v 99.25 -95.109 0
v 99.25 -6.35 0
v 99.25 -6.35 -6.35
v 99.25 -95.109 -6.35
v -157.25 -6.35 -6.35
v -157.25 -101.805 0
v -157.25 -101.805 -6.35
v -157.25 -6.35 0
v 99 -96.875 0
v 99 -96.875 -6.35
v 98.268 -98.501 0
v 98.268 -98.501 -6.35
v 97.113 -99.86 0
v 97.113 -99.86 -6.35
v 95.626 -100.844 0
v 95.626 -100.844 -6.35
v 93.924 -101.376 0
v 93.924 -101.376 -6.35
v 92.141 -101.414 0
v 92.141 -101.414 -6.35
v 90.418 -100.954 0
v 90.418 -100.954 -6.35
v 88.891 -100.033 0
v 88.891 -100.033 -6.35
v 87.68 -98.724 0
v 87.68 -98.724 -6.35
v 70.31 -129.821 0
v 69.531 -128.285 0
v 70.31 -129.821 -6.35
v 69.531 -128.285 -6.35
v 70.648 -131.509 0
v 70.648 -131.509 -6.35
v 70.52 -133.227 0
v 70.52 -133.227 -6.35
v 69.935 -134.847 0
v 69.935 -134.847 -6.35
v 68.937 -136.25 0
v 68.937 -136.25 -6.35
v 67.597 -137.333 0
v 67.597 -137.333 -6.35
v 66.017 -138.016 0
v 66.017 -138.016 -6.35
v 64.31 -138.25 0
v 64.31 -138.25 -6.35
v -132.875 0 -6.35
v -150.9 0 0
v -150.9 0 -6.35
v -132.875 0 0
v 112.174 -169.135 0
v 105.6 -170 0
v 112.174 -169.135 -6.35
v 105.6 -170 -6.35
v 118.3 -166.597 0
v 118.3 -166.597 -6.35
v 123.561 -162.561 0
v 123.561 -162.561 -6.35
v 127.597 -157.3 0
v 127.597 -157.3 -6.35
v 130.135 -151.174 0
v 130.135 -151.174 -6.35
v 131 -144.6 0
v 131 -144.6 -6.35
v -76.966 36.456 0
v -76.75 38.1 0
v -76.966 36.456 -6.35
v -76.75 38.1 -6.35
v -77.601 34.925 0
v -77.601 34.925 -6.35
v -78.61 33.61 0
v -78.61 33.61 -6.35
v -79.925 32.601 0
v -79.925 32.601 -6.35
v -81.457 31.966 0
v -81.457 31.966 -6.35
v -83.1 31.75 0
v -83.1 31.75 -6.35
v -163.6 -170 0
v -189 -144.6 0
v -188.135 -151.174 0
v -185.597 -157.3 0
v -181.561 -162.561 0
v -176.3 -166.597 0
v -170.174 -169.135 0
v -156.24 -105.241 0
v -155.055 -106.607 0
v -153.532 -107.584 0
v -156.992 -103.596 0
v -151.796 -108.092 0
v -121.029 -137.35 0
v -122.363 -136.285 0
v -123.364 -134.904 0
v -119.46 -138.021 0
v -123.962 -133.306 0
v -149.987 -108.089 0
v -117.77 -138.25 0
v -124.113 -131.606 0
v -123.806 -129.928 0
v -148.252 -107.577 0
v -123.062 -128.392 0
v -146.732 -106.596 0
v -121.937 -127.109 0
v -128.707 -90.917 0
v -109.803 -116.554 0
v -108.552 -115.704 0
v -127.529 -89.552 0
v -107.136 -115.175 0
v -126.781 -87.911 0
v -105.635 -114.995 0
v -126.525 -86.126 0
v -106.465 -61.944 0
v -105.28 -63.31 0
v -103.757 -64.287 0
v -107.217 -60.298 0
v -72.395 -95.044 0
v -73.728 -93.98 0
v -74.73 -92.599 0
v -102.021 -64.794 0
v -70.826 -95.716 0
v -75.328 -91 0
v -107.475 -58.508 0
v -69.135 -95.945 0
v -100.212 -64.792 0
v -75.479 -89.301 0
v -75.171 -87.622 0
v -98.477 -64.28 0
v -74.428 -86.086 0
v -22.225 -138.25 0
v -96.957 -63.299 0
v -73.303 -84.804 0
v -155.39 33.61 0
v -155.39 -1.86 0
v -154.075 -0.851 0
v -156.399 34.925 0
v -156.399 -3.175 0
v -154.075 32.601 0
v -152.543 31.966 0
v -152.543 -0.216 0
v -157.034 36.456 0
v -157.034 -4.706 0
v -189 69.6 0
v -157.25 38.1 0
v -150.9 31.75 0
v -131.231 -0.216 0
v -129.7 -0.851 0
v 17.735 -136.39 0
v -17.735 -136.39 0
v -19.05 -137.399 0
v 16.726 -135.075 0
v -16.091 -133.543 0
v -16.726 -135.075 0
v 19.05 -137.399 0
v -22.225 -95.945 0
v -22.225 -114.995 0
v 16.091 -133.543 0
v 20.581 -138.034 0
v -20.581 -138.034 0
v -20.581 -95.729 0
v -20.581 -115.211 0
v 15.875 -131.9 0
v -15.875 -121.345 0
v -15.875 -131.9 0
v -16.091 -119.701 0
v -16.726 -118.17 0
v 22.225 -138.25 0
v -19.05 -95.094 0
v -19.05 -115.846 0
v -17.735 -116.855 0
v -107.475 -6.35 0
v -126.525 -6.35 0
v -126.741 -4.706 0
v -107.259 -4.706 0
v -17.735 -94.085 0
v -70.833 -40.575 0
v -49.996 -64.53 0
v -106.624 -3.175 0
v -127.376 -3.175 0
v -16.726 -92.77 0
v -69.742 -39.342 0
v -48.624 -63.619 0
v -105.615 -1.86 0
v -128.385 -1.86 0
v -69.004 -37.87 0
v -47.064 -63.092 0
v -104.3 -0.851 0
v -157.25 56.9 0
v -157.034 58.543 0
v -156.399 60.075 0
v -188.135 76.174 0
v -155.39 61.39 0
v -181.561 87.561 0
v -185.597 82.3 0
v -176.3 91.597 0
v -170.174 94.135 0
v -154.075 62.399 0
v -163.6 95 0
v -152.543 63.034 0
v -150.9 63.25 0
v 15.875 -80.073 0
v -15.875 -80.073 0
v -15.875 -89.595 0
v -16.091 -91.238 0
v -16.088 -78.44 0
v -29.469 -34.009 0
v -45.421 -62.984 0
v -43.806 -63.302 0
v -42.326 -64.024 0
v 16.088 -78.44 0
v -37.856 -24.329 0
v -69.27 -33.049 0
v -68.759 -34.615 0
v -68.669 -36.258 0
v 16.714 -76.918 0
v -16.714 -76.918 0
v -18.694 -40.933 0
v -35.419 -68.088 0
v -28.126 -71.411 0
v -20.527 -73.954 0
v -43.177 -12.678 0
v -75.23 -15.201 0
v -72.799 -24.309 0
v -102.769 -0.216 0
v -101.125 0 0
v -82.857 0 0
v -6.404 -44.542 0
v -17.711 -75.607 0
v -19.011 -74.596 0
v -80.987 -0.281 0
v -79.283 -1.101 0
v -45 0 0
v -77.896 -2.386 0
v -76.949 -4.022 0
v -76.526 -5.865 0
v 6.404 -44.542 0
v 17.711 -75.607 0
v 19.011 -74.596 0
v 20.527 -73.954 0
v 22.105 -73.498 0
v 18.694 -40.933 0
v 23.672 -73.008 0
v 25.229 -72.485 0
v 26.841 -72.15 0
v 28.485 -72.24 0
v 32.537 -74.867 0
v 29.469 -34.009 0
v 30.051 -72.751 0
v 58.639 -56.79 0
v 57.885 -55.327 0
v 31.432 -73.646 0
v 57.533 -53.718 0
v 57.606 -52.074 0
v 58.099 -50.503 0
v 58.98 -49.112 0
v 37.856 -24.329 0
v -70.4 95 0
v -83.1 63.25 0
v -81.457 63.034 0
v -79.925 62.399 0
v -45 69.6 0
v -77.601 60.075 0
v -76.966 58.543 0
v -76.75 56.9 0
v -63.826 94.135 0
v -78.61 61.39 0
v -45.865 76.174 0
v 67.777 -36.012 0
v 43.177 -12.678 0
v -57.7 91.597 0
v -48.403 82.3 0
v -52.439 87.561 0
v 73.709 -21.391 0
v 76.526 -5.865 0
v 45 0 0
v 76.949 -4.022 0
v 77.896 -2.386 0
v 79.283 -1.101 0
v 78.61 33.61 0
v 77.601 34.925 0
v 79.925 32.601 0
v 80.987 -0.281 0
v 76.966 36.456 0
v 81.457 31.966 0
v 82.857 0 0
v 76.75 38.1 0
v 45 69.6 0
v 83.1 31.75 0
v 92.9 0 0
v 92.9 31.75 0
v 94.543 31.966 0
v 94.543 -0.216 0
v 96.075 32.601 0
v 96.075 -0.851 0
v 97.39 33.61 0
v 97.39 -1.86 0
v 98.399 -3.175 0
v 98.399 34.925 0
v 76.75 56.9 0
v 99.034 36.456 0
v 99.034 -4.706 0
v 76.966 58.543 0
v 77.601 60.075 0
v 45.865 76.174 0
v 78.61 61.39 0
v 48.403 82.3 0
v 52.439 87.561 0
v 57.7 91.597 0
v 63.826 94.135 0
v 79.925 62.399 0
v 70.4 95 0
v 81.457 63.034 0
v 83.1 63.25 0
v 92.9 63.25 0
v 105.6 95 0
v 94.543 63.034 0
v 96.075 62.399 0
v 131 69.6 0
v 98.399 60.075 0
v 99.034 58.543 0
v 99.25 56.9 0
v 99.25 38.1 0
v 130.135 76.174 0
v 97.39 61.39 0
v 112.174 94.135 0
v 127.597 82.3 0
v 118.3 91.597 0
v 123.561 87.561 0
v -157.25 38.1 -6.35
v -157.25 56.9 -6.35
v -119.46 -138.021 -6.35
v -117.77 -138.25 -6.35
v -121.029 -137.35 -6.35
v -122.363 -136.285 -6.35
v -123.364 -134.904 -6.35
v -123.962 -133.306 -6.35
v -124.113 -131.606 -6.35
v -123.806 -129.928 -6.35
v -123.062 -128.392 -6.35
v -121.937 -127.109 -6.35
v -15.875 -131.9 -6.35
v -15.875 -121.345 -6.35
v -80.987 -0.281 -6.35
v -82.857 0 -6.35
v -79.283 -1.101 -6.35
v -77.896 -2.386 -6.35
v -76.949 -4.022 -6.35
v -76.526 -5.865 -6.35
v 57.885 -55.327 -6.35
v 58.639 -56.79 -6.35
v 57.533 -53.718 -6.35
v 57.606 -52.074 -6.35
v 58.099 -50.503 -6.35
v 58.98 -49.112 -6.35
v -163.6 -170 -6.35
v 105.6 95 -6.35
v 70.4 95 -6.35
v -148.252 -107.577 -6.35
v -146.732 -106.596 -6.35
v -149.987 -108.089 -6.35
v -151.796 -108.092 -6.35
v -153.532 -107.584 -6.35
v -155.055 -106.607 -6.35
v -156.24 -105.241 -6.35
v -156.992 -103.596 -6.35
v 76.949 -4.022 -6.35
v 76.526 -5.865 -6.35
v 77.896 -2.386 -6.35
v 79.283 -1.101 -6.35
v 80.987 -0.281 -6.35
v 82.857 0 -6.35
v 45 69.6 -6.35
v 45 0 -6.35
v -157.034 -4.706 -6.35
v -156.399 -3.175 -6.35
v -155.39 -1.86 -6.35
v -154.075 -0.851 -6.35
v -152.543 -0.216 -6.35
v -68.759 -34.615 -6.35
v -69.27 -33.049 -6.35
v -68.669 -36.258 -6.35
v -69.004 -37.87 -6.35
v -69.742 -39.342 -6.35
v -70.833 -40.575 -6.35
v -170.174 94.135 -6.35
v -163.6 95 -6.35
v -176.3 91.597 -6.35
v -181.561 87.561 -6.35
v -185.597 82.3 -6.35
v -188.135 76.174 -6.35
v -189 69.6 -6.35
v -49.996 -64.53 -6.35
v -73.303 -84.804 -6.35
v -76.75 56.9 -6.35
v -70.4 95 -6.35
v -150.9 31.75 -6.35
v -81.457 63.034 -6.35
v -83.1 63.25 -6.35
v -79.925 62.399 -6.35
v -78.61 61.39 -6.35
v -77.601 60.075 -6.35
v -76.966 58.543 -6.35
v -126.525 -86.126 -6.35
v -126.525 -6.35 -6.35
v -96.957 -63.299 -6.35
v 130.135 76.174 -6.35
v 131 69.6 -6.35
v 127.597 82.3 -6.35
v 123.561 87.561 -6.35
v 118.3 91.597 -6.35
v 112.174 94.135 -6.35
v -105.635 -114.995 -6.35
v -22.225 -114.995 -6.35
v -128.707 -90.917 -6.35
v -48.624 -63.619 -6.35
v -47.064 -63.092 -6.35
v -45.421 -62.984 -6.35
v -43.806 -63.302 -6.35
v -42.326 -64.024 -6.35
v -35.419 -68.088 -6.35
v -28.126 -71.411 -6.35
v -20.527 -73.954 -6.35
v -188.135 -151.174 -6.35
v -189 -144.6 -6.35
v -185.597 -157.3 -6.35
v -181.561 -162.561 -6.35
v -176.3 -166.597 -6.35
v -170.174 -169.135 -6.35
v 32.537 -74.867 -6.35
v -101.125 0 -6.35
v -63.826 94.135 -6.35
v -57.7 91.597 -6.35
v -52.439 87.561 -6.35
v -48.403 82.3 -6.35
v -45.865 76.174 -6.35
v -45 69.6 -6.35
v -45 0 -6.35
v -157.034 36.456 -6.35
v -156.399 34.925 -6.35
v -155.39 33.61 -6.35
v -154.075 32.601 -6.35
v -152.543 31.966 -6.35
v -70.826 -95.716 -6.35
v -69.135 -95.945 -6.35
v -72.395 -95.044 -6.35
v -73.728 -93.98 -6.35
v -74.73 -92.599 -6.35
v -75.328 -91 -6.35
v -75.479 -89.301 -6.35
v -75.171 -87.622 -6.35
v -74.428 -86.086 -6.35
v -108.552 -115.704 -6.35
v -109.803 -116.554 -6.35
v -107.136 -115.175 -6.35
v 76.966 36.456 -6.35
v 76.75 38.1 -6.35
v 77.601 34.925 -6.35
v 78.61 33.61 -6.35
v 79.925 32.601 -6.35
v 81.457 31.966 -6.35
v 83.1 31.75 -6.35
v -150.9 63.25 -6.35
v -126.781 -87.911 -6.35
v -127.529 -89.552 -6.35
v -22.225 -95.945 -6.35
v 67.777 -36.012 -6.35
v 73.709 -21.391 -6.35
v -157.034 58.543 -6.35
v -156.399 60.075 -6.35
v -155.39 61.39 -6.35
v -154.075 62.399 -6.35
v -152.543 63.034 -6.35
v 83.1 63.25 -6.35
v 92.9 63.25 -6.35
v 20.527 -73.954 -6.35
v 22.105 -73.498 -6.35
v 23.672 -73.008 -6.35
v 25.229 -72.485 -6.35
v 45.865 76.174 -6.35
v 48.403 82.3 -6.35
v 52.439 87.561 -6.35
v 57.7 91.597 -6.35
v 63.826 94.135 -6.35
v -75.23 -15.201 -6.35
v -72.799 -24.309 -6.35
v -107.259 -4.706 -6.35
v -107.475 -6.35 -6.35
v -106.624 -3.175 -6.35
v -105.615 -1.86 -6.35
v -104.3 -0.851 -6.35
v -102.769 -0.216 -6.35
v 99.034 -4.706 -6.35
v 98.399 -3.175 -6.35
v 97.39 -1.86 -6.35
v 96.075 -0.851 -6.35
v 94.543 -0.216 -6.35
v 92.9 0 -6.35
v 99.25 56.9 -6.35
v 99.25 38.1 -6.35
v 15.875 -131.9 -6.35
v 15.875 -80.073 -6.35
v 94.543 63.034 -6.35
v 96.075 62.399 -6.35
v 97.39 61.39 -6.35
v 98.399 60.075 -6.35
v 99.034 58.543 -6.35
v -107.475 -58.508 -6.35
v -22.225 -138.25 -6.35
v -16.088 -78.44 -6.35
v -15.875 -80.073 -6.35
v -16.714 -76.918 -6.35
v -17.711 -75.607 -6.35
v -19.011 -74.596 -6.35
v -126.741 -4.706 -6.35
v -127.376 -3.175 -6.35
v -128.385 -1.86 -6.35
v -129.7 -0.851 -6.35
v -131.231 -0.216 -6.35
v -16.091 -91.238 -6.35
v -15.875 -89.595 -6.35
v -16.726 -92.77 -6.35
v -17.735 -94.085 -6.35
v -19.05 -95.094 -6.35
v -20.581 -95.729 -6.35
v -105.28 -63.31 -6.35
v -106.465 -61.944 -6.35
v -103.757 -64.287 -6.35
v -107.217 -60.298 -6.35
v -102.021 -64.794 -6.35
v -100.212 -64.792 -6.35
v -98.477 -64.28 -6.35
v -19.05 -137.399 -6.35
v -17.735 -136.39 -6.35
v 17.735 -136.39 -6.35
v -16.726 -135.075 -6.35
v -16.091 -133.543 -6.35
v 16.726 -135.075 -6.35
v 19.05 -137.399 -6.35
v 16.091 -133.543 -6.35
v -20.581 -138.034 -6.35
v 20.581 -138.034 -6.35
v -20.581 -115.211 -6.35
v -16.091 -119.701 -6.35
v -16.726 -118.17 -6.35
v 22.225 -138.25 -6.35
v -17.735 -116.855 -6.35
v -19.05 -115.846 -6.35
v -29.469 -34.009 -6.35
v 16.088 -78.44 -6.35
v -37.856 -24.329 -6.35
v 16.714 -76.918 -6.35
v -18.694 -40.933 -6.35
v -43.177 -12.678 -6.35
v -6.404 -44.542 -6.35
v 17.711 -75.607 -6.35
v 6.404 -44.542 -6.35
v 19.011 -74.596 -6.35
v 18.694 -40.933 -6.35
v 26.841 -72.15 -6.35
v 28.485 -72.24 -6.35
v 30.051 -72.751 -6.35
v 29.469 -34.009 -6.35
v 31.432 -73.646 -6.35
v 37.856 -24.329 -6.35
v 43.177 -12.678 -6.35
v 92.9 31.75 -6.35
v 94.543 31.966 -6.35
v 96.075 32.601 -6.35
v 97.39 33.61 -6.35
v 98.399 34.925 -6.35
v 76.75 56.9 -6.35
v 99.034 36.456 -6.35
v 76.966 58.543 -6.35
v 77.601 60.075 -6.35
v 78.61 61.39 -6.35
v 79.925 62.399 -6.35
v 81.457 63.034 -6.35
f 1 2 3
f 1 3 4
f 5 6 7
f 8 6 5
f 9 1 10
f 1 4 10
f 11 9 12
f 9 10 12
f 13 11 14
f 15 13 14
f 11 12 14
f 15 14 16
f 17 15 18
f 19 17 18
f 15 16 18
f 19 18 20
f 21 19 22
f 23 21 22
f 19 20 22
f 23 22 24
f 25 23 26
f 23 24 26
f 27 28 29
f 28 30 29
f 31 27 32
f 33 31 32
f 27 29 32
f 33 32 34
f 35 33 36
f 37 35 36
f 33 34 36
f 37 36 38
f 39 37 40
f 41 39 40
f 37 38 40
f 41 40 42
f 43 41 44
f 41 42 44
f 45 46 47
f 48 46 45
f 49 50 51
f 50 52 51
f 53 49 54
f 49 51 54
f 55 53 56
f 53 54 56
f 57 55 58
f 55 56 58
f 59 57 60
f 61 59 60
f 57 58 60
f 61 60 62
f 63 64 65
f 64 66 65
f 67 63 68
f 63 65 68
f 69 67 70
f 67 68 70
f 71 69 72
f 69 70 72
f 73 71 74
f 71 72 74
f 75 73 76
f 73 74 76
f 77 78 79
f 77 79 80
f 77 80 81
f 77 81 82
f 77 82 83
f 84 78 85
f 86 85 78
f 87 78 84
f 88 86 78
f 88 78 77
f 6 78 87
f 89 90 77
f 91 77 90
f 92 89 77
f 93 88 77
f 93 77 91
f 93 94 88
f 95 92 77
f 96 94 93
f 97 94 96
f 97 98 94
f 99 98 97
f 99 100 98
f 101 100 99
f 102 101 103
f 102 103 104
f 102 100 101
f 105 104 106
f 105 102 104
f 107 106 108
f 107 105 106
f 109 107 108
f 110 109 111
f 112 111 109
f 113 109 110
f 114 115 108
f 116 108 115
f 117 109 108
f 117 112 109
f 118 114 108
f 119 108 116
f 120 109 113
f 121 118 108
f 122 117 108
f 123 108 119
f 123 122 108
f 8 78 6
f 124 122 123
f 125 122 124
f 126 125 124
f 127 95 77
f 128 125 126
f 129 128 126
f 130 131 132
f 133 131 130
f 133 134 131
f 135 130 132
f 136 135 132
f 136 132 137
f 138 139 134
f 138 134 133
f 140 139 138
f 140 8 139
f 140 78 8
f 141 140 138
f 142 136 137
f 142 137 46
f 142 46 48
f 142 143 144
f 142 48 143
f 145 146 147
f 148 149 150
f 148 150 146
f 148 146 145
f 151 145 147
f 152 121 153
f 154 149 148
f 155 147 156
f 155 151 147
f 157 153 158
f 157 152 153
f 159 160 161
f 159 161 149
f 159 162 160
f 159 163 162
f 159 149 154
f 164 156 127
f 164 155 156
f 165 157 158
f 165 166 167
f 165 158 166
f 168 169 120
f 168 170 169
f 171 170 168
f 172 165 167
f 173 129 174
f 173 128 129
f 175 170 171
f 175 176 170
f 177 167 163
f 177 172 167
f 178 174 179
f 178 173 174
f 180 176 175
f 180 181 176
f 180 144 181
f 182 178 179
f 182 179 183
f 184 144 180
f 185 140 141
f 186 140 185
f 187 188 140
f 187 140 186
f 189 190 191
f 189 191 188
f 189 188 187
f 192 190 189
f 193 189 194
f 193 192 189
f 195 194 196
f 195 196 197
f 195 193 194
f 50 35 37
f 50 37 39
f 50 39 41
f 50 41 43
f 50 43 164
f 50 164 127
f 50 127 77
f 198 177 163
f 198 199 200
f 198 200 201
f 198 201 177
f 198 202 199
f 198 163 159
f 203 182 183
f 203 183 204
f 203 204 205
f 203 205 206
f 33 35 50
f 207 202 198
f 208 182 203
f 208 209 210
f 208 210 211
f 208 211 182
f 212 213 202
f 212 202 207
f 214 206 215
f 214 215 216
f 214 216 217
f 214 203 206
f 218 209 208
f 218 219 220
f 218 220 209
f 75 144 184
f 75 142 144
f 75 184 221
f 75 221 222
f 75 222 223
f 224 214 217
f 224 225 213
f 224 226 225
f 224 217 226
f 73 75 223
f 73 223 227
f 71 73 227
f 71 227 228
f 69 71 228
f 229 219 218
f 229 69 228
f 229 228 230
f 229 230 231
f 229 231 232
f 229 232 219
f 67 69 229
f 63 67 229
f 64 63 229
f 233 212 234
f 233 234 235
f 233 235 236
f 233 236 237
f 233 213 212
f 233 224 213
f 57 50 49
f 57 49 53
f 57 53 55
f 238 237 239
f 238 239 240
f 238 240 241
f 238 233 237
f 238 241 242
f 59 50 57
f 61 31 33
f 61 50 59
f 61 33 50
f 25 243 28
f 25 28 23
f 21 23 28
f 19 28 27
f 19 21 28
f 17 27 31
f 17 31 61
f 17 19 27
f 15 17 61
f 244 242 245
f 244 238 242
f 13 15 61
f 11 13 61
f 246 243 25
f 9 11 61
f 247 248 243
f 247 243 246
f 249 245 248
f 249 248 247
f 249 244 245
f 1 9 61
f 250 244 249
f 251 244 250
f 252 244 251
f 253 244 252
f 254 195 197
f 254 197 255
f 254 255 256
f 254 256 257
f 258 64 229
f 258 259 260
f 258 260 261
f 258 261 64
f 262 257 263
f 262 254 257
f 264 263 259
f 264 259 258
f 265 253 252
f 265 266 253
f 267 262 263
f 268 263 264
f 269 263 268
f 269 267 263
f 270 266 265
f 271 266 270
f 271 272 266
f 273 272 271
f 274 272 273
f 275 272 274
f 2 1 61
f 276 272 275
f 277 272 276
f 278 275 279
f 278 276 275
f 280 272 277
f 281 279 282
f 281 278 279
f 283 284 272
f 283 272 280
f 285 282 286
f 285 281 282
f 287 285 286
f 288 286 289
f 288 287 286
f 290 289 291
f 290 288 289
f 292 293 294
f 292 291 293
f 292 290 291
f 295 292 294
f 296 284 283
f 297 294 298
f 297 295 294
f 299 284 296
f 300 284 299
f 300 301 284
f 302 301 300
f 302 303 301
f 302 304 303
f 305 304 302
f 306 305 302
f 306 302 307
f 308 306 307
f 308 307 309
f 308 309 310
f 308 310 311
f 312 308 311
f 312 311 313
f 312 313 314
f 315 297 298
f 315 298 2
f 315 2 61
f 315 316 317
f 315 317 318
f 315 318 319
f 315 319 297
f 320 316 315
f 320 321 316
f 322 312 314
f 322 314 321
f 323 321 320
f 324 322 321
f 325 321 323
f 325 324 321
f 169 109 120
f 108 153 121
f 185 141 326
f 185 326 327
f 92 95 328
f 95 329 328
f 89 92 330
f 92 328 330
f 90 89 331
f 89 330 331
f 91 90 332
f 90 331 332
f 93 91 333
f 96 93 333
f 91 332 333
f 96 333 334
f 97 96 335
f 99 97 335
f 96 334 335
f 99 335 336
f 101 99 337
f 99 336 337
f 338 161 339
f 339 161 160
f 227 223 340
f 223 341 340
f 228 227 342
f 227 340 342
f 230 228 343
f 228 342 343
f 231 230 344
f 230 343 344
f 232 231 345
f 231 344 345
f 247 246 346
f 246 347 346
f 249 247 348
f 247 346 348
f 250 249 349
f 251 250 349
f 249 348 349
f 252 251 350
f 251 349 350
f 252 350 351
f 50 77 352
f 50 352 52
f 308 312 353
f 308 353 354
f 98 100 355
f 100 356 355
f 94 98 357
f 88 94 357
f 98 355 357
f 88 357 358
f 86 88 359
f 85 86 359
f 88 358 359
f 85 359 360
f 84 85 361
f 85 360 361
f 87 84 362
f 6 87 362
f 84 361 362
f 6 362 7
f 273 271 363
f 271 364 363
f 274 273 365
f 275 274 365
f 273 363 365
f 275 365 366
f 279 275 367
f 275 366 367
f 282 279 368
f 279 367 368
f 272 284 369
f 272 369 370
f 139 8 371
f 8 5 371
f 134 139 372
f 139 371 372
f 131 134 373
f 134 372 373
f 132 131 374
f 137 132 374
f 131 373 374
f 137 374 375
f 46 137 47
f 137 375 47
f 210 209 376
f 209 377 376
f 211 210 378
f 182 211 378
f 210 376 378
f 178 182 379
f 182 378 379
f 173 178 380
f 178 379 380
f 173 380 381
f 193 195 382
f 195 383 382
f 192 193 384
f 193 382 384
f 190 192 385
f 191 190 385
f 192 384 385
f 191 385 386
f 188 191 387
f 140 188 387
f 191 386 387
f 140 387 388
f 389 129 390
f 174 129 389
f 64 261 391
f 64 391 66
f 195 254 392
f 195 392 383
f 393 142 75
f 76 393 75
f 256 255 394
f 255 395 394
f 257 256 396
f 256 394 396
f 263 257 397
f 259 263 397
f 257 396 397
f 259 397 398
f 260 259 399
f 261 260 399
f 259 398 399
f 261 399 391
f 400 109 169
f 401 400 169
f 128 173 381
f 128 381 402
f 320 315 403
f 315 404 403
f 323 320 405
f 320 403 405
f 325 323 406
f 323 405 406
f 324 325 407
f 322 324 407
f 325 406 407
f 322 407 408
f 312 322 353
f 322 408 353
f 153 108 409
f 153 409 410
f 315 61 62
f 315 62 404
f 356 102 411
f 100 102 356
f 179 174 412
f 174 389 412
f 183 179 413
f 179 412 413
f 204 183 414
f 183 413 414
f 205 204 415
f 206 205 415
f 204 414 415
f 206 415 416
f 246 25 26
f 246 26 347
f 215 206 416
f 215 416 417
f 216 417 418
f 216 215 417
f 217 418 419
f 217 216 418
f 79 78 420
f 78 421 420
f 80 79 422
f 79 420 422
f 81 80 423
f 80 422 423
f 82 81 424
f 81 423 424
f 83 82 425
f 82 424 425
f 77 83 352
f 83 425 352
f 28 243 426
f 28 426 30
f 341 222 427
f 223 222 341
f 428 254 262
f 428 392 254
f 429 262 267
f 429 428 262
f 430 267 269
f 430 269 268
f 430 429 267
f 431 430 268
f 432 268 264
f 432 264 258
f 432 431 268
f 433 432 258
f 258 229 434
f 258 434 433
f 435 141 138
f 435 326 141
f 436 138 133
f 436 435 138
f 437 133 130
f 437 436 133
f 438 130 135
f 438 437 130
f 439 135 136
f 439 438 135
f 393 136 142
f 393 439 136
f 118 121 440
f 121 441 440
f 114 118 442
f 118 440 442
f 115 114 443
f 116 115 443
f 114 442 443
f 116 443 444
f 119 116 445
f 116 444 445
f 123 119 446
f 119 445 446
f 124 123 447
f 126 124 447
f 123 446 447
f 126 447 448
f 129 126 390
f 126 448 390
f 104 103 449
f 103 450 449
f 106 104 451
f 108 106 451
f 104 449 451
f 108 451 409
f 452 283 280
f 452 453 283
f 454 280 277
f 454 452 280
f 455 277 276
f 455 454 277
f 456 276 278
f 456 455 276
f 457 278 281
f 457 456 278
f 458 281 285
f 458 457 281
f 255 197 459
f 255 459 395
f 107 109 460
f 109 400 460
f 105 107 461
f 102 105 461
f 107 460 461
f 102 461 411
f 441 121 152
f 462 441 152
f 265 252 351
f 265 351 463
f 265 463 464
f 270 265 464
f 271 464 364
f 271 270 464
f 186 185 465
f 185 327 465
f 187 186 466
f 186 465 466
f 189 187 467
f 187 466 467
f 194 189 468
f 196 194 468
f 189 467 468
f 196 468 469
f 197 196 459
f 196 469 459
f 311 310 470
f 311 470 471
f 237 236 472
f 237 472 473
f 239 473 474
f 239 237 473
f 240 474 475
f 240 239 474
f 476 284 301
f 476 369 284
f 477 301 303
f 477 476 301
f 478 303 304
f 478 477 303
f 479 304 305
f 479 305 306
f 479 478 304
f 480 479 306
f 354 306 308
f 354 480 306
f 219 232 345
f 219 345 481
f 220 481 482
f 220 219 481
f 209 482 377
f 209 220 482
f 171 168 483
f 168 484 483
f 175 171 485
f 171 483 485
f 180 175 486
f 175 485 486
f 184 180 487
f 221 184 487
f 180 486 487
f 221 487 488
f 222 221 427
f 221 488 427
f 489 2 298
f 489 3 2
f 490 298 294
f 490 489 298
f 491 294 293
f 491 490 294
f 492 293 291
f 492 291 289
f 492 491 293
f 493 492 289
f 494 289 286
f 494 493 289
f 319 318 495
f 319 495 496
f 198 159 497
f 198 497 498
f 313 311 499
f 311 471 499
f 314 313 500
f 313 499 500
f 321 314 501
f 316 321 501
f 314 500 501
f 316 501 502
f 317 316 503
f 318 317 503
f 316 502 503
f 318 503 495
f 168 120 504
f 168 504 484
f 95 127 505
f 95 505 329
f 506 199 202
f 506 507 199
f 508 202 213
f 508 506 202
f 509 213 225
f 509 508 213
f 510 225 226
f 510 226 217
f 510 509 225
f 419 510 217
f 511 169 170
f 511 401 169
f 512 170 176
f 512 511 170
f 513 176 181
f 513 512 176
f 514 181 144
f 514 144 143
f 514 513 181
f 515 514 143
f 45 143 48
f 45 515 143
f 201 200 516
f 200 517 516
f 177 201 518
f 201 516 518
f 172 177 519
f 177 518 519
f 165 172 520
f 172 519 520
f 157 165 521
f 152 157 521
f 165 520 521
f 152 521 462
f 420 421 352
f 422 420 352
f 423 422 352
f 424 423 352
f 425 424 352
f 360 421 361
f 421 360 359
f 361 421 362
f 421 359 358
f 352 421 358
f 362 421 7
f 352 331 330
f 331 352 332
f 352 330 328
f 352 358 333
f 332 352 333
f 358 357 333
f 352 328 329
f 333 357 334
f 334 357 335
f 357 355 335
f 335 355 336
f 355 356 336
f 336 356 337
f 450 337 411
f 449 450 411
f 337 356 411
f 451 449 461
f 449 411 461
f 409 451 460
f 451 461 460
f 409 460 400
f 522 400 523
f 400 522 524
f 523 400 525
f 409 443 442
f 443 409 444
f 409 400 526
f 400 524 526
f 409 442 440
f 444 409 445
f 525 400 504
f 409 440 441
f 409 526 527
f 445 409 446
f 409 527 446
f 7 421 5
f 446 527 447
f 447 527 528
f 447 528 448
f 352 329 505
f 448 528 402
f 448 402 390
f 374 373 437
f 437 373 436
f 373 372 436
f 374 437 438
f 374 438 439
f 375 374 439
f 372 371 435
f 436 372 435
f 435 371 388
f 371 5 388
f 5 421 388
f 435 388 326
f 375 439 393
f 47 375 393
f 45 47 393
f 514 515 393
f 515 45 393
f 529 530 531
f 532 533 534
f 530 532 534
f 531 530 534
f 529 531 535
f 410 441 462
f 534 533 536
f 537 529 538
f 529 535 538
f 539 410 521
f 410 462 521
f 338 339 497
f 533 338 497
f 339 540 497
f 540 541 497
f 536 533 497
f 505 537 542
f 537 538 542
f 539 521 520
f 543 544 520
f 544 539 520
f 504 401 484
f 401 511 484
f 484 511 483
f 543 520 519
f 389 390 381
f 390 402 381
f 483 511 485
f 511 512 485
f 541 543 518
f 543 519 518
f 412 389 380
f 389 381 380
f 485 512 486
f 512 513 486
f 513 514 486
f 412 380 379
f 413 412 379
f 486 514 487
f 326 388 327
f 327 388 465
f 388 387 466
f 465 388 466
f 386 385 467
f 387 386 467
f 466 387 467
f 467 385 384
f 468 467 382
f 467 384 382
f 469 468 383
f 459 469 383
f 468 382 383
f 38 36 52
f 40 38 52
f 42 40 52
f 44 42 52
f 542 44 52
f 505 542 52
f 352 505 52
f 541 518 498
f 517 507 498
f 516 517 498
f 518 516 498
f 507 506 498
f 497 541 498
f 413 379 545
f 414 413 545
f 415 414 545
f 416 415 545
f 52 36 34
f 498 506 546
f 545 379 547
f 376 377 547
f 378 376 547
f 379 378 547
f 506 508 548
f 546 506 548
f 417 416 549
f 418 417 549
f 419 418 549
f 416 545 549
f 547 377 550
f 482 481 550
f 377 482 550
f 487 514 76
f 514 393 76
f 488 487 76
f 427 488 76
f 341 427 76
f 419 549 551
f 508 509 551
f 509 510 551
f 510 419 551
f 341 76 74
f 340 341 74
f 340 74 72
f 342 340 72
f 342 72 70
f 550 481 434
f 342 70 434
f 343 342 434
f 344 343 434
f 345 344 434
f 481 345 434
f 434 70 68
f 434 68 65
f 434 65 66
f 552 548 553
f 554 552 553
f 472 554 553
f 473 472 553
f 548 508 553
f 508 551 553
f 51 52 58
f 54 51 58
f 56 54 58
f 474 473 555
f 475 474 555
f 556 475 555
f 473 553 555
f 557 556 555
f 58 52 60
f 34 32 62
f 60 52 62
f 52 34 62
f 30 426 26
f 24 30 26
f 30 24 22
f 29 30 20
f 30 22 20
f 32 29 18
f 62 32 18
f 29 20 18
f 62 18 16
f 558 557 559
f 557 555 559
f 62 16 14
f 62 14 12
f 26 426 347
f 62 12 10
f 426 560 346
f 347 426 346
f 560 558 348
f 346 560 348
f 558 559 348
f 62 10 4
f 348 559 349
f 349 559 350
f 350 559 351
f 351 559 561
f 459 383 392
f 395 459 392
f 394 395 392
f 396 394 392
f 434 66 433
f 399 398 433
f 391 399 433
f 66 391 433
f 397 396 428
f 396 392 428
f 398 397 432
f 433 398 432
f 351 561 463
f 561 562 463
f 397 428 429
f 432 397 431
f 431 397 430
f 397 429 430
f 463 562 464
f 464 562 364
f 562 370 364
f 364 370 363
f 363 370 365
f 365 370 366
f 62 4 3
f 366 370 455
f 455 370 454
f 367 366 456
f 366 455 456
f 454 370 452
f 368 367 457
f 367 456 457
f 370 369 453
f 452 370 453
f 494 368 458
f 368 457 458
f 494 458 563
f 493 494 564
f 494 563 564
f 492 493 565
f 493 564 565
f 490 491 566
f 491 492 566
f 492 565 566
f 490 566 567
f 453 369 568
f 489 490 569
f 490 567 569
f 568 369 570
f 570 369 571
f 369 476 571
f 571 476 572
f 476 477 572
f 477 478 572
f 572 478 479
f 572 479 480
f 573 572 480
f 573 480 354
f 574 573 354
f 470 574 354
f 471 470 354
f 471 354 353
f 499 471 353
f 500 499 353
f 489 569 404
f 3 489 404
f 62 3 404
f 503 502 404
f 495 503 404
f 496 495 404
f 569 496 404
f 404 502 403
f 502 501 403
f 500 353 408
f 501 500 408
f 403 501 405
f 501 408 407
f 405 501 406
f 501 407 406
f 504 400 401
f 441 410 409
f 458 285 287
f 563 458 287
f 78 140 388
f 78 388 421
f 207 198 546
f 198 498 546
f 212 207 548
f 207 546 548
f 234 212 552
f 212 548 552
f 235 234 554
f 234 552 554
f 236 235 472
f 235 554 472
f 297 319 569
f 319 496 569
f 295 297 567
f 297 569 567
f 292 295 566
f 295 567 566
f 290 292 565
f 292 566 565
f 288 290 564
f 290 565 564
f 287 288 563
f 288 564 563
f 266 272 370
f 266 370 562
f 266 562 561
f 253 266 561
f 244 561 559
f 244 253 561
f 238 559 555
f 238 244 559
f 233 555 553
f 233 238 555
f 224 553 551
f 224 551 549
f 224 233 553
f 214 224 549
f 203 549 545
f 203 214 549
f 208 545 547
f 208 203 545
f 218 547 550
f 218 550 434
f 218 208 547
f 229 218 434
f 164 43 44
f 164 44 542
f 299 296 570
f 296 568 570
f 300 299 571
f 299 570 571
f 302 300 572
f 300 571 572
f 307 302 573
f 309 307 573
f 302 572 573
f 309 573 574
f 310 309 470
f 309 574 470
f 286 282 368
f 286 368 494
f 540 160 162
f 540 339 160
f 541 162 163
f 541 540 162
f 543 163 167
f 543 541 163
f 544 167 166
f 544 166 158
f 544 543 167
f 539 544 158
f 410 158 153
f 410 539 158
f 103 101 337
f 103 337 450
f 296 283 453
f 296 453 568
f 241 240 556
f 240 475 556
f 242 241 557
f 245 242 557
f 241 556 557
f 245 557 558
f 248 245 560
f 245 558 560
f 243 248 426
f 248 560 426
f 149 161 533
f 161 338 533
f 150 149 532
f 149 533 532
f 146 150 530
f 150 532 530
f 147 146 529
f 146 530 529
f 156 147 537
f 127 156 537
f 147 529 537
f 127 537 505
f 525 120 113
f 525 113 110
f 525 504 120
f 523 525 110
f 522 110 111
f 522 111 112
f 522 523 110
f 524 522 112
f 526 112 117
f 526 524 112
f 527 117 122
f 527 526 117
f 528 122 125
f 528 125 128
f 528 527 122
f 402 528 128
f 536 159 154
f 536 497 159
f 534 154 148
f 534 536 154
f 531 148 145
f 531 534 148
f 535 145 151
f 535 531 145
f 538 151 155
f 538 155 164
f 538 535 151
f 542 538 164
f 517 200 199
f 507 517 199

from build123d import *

# Parameters (mm, degrees)
F1_DEPTH = 6.35
F2_W     = 31.75
F2_H     = 63.1597361455
F2_W_2   = 80.4999943972
F2_H_2   = 31.75
F2_W_3   = 22.4999943972
F3_DEPTH = 6.35
F4_W     = 19.05
F4_H     = 89.0185771326
F4_W_2   = 92.1357582898
F4_H_2   = 19.05
F5_DEPTH = 6.35
F6_R     = 25.4
F7_R     = 6.35


with BuildPart() as f1:
    # F0 (on Top) → F1 (new body)
    with BuildSketch(Plane.XY):
        with BuildLine():
            Line((-45, 95), (-189, 95))
            Line((-189, 95), (-189, -170))
            Line((-189, -170), (131, -170))
            Line((131, -170), (131, 95))
            Line((131, 95), (45, 95))
            Line((45, 95), (45, 0))
            ThreePointArc((45, 0), (0, -45), (-45, 0))
            Line((-45, 0), (-45, 95))
        make_face()
        with BuildLine():
            Line((-76.7500028014, 63.2499971986), (-76.7500028014, 0))
            ThreePointArc((-76.7500028014, 0), (0, -76.7500028014), (76.7500028014, 0))
            Line((76.7500028014, 0), (76.7500028014, 63.2499971986))
            Line((76.7500028014, 63.2499971986), (99.2499971986, 63.2499971986))
            Line((99.2499971986, 63.2499971986), (99.2499971986, -138.2499971986))
            Line((99.2499971986, -138.2499971986), (-157.2499971986, -138.2499971986))
            Line((-157.2499971986, -138.2499971986), (-157.2499971986, 63.2499971986))
            Line((-157.2499971986, 63.2499971986), (-76.7500028014, 63.2499971986))
        make_face(mode=Mode.SUBTRACT)
    extrude(amount=-F1_DEPTH)

    # F2 (on face) → F3 (join)
    with BuildSketch(Plane.XY):
        with Locations((0, -106.6701291258)):
            Rectangle(F2_W, F2_H)
        with Locations((-117, 15.875)):
            Rectangle(F2_W_2, F2_H_2)
        with Locations((88, 15.875)):
            Rectangle(F2_W_3, F2_H_2)
        Polygon((-46.2363796826, -61.2597757412), (-67.0740856459, -37.3045568904), (-157.2499971986, -115.7450479419), (-157.2499971986, -138.2499971986), (-134.7450479419, -138.2499971986), align=None)
        Polygon((55.8022859826, -52.6940965302), (29.7003793774, -70.7704062081), (76.4319075424, -138.2499971986), (99.2499971986, -138.2499971986), (99.2499971986, -115.4319075424), align=None)
    extrude(amount=-F3_DEPTH)

    # F4 (on face) → F5 (join)
    with BuildSketch(Plane.XY):
        with Locations((-117, -44.5092885663)):
            Rectangle(F4_W, F4_H)
        with Locations((-61.9428791449, -105.4698864699)):
            Rectangle(F4_W_2, F4_H_2)
    extrude(amount=-F5_DEPTH)

    # F6
    f6_edges = [f1.edges().sort_by_distance(p)[0] for p in [
        (-189, 95, -3.175),
        (-189, -170, -3.175),
        (131, -170, -3.175),
        (131, 95, -3.175),
        (45, 95, -3.175),
        (-45, 95, -3.175),
    ]]
    fillet(f6_edges, radius=F6_R)

    # F7
    f7_edges = [f1.edges().sort_by_distance(p)[0] for p in [
        (76.750003, 63.249997, -3.175),
        (99.249997, 63.249997, -3.175),
        (76.750003, 31.75, -3.175),
        (99.249997, 31.75, -3.175),
        (55.802286, -52.694097, -3.175),
        (-157.249997, 31.75, -3.175),
        (-134.745048, -138.249997, -3.175),
        (-86.110703, -95.944886, -3.175),
        (15.875, -138.249997, -3.175),
        (-157.249997, 0, -3.175),
        (-157.249997, 63.249997, -3.175),
        (-107.475, 0, -3.175),
        (-46.23638, -61.259776, -3.175),
        (-108.010758, -114.994886, -3.175),
        (15.875, -75.090261, -3.175),
        (76.750003, 0, -3.175),
        (-76.750003, 31.75, -3.175),
        (-67.074086, -37.304557, -3.175),
        (-15.875, -95.944886, -3.175),
        (76.431908, -138.249997, -3.175),
        (-15.875, -138.249997, -3.175),
        (-126.525, -89.018577, -3.175),
        (-107.475, -72.447729, -3.175),
        (-157.249997, -115.745048, -3.175),
        (99.249997, 0, -3.175),
        (-15.875, -75.090261, -3.175),
        (-15.875, -114.994886, -3.175),
        (-76.750003, 0, -3.175),
        (-76.750003, 63.249997, -3.175),
        (29.700379, -70.770406, -3.175),
        (-126.525, 0, -3.175),
        (99.249997, -115.431908, -3.175),
    ]]
    fillet(f7_edges, radius=F7_R)


solid = f1.part
